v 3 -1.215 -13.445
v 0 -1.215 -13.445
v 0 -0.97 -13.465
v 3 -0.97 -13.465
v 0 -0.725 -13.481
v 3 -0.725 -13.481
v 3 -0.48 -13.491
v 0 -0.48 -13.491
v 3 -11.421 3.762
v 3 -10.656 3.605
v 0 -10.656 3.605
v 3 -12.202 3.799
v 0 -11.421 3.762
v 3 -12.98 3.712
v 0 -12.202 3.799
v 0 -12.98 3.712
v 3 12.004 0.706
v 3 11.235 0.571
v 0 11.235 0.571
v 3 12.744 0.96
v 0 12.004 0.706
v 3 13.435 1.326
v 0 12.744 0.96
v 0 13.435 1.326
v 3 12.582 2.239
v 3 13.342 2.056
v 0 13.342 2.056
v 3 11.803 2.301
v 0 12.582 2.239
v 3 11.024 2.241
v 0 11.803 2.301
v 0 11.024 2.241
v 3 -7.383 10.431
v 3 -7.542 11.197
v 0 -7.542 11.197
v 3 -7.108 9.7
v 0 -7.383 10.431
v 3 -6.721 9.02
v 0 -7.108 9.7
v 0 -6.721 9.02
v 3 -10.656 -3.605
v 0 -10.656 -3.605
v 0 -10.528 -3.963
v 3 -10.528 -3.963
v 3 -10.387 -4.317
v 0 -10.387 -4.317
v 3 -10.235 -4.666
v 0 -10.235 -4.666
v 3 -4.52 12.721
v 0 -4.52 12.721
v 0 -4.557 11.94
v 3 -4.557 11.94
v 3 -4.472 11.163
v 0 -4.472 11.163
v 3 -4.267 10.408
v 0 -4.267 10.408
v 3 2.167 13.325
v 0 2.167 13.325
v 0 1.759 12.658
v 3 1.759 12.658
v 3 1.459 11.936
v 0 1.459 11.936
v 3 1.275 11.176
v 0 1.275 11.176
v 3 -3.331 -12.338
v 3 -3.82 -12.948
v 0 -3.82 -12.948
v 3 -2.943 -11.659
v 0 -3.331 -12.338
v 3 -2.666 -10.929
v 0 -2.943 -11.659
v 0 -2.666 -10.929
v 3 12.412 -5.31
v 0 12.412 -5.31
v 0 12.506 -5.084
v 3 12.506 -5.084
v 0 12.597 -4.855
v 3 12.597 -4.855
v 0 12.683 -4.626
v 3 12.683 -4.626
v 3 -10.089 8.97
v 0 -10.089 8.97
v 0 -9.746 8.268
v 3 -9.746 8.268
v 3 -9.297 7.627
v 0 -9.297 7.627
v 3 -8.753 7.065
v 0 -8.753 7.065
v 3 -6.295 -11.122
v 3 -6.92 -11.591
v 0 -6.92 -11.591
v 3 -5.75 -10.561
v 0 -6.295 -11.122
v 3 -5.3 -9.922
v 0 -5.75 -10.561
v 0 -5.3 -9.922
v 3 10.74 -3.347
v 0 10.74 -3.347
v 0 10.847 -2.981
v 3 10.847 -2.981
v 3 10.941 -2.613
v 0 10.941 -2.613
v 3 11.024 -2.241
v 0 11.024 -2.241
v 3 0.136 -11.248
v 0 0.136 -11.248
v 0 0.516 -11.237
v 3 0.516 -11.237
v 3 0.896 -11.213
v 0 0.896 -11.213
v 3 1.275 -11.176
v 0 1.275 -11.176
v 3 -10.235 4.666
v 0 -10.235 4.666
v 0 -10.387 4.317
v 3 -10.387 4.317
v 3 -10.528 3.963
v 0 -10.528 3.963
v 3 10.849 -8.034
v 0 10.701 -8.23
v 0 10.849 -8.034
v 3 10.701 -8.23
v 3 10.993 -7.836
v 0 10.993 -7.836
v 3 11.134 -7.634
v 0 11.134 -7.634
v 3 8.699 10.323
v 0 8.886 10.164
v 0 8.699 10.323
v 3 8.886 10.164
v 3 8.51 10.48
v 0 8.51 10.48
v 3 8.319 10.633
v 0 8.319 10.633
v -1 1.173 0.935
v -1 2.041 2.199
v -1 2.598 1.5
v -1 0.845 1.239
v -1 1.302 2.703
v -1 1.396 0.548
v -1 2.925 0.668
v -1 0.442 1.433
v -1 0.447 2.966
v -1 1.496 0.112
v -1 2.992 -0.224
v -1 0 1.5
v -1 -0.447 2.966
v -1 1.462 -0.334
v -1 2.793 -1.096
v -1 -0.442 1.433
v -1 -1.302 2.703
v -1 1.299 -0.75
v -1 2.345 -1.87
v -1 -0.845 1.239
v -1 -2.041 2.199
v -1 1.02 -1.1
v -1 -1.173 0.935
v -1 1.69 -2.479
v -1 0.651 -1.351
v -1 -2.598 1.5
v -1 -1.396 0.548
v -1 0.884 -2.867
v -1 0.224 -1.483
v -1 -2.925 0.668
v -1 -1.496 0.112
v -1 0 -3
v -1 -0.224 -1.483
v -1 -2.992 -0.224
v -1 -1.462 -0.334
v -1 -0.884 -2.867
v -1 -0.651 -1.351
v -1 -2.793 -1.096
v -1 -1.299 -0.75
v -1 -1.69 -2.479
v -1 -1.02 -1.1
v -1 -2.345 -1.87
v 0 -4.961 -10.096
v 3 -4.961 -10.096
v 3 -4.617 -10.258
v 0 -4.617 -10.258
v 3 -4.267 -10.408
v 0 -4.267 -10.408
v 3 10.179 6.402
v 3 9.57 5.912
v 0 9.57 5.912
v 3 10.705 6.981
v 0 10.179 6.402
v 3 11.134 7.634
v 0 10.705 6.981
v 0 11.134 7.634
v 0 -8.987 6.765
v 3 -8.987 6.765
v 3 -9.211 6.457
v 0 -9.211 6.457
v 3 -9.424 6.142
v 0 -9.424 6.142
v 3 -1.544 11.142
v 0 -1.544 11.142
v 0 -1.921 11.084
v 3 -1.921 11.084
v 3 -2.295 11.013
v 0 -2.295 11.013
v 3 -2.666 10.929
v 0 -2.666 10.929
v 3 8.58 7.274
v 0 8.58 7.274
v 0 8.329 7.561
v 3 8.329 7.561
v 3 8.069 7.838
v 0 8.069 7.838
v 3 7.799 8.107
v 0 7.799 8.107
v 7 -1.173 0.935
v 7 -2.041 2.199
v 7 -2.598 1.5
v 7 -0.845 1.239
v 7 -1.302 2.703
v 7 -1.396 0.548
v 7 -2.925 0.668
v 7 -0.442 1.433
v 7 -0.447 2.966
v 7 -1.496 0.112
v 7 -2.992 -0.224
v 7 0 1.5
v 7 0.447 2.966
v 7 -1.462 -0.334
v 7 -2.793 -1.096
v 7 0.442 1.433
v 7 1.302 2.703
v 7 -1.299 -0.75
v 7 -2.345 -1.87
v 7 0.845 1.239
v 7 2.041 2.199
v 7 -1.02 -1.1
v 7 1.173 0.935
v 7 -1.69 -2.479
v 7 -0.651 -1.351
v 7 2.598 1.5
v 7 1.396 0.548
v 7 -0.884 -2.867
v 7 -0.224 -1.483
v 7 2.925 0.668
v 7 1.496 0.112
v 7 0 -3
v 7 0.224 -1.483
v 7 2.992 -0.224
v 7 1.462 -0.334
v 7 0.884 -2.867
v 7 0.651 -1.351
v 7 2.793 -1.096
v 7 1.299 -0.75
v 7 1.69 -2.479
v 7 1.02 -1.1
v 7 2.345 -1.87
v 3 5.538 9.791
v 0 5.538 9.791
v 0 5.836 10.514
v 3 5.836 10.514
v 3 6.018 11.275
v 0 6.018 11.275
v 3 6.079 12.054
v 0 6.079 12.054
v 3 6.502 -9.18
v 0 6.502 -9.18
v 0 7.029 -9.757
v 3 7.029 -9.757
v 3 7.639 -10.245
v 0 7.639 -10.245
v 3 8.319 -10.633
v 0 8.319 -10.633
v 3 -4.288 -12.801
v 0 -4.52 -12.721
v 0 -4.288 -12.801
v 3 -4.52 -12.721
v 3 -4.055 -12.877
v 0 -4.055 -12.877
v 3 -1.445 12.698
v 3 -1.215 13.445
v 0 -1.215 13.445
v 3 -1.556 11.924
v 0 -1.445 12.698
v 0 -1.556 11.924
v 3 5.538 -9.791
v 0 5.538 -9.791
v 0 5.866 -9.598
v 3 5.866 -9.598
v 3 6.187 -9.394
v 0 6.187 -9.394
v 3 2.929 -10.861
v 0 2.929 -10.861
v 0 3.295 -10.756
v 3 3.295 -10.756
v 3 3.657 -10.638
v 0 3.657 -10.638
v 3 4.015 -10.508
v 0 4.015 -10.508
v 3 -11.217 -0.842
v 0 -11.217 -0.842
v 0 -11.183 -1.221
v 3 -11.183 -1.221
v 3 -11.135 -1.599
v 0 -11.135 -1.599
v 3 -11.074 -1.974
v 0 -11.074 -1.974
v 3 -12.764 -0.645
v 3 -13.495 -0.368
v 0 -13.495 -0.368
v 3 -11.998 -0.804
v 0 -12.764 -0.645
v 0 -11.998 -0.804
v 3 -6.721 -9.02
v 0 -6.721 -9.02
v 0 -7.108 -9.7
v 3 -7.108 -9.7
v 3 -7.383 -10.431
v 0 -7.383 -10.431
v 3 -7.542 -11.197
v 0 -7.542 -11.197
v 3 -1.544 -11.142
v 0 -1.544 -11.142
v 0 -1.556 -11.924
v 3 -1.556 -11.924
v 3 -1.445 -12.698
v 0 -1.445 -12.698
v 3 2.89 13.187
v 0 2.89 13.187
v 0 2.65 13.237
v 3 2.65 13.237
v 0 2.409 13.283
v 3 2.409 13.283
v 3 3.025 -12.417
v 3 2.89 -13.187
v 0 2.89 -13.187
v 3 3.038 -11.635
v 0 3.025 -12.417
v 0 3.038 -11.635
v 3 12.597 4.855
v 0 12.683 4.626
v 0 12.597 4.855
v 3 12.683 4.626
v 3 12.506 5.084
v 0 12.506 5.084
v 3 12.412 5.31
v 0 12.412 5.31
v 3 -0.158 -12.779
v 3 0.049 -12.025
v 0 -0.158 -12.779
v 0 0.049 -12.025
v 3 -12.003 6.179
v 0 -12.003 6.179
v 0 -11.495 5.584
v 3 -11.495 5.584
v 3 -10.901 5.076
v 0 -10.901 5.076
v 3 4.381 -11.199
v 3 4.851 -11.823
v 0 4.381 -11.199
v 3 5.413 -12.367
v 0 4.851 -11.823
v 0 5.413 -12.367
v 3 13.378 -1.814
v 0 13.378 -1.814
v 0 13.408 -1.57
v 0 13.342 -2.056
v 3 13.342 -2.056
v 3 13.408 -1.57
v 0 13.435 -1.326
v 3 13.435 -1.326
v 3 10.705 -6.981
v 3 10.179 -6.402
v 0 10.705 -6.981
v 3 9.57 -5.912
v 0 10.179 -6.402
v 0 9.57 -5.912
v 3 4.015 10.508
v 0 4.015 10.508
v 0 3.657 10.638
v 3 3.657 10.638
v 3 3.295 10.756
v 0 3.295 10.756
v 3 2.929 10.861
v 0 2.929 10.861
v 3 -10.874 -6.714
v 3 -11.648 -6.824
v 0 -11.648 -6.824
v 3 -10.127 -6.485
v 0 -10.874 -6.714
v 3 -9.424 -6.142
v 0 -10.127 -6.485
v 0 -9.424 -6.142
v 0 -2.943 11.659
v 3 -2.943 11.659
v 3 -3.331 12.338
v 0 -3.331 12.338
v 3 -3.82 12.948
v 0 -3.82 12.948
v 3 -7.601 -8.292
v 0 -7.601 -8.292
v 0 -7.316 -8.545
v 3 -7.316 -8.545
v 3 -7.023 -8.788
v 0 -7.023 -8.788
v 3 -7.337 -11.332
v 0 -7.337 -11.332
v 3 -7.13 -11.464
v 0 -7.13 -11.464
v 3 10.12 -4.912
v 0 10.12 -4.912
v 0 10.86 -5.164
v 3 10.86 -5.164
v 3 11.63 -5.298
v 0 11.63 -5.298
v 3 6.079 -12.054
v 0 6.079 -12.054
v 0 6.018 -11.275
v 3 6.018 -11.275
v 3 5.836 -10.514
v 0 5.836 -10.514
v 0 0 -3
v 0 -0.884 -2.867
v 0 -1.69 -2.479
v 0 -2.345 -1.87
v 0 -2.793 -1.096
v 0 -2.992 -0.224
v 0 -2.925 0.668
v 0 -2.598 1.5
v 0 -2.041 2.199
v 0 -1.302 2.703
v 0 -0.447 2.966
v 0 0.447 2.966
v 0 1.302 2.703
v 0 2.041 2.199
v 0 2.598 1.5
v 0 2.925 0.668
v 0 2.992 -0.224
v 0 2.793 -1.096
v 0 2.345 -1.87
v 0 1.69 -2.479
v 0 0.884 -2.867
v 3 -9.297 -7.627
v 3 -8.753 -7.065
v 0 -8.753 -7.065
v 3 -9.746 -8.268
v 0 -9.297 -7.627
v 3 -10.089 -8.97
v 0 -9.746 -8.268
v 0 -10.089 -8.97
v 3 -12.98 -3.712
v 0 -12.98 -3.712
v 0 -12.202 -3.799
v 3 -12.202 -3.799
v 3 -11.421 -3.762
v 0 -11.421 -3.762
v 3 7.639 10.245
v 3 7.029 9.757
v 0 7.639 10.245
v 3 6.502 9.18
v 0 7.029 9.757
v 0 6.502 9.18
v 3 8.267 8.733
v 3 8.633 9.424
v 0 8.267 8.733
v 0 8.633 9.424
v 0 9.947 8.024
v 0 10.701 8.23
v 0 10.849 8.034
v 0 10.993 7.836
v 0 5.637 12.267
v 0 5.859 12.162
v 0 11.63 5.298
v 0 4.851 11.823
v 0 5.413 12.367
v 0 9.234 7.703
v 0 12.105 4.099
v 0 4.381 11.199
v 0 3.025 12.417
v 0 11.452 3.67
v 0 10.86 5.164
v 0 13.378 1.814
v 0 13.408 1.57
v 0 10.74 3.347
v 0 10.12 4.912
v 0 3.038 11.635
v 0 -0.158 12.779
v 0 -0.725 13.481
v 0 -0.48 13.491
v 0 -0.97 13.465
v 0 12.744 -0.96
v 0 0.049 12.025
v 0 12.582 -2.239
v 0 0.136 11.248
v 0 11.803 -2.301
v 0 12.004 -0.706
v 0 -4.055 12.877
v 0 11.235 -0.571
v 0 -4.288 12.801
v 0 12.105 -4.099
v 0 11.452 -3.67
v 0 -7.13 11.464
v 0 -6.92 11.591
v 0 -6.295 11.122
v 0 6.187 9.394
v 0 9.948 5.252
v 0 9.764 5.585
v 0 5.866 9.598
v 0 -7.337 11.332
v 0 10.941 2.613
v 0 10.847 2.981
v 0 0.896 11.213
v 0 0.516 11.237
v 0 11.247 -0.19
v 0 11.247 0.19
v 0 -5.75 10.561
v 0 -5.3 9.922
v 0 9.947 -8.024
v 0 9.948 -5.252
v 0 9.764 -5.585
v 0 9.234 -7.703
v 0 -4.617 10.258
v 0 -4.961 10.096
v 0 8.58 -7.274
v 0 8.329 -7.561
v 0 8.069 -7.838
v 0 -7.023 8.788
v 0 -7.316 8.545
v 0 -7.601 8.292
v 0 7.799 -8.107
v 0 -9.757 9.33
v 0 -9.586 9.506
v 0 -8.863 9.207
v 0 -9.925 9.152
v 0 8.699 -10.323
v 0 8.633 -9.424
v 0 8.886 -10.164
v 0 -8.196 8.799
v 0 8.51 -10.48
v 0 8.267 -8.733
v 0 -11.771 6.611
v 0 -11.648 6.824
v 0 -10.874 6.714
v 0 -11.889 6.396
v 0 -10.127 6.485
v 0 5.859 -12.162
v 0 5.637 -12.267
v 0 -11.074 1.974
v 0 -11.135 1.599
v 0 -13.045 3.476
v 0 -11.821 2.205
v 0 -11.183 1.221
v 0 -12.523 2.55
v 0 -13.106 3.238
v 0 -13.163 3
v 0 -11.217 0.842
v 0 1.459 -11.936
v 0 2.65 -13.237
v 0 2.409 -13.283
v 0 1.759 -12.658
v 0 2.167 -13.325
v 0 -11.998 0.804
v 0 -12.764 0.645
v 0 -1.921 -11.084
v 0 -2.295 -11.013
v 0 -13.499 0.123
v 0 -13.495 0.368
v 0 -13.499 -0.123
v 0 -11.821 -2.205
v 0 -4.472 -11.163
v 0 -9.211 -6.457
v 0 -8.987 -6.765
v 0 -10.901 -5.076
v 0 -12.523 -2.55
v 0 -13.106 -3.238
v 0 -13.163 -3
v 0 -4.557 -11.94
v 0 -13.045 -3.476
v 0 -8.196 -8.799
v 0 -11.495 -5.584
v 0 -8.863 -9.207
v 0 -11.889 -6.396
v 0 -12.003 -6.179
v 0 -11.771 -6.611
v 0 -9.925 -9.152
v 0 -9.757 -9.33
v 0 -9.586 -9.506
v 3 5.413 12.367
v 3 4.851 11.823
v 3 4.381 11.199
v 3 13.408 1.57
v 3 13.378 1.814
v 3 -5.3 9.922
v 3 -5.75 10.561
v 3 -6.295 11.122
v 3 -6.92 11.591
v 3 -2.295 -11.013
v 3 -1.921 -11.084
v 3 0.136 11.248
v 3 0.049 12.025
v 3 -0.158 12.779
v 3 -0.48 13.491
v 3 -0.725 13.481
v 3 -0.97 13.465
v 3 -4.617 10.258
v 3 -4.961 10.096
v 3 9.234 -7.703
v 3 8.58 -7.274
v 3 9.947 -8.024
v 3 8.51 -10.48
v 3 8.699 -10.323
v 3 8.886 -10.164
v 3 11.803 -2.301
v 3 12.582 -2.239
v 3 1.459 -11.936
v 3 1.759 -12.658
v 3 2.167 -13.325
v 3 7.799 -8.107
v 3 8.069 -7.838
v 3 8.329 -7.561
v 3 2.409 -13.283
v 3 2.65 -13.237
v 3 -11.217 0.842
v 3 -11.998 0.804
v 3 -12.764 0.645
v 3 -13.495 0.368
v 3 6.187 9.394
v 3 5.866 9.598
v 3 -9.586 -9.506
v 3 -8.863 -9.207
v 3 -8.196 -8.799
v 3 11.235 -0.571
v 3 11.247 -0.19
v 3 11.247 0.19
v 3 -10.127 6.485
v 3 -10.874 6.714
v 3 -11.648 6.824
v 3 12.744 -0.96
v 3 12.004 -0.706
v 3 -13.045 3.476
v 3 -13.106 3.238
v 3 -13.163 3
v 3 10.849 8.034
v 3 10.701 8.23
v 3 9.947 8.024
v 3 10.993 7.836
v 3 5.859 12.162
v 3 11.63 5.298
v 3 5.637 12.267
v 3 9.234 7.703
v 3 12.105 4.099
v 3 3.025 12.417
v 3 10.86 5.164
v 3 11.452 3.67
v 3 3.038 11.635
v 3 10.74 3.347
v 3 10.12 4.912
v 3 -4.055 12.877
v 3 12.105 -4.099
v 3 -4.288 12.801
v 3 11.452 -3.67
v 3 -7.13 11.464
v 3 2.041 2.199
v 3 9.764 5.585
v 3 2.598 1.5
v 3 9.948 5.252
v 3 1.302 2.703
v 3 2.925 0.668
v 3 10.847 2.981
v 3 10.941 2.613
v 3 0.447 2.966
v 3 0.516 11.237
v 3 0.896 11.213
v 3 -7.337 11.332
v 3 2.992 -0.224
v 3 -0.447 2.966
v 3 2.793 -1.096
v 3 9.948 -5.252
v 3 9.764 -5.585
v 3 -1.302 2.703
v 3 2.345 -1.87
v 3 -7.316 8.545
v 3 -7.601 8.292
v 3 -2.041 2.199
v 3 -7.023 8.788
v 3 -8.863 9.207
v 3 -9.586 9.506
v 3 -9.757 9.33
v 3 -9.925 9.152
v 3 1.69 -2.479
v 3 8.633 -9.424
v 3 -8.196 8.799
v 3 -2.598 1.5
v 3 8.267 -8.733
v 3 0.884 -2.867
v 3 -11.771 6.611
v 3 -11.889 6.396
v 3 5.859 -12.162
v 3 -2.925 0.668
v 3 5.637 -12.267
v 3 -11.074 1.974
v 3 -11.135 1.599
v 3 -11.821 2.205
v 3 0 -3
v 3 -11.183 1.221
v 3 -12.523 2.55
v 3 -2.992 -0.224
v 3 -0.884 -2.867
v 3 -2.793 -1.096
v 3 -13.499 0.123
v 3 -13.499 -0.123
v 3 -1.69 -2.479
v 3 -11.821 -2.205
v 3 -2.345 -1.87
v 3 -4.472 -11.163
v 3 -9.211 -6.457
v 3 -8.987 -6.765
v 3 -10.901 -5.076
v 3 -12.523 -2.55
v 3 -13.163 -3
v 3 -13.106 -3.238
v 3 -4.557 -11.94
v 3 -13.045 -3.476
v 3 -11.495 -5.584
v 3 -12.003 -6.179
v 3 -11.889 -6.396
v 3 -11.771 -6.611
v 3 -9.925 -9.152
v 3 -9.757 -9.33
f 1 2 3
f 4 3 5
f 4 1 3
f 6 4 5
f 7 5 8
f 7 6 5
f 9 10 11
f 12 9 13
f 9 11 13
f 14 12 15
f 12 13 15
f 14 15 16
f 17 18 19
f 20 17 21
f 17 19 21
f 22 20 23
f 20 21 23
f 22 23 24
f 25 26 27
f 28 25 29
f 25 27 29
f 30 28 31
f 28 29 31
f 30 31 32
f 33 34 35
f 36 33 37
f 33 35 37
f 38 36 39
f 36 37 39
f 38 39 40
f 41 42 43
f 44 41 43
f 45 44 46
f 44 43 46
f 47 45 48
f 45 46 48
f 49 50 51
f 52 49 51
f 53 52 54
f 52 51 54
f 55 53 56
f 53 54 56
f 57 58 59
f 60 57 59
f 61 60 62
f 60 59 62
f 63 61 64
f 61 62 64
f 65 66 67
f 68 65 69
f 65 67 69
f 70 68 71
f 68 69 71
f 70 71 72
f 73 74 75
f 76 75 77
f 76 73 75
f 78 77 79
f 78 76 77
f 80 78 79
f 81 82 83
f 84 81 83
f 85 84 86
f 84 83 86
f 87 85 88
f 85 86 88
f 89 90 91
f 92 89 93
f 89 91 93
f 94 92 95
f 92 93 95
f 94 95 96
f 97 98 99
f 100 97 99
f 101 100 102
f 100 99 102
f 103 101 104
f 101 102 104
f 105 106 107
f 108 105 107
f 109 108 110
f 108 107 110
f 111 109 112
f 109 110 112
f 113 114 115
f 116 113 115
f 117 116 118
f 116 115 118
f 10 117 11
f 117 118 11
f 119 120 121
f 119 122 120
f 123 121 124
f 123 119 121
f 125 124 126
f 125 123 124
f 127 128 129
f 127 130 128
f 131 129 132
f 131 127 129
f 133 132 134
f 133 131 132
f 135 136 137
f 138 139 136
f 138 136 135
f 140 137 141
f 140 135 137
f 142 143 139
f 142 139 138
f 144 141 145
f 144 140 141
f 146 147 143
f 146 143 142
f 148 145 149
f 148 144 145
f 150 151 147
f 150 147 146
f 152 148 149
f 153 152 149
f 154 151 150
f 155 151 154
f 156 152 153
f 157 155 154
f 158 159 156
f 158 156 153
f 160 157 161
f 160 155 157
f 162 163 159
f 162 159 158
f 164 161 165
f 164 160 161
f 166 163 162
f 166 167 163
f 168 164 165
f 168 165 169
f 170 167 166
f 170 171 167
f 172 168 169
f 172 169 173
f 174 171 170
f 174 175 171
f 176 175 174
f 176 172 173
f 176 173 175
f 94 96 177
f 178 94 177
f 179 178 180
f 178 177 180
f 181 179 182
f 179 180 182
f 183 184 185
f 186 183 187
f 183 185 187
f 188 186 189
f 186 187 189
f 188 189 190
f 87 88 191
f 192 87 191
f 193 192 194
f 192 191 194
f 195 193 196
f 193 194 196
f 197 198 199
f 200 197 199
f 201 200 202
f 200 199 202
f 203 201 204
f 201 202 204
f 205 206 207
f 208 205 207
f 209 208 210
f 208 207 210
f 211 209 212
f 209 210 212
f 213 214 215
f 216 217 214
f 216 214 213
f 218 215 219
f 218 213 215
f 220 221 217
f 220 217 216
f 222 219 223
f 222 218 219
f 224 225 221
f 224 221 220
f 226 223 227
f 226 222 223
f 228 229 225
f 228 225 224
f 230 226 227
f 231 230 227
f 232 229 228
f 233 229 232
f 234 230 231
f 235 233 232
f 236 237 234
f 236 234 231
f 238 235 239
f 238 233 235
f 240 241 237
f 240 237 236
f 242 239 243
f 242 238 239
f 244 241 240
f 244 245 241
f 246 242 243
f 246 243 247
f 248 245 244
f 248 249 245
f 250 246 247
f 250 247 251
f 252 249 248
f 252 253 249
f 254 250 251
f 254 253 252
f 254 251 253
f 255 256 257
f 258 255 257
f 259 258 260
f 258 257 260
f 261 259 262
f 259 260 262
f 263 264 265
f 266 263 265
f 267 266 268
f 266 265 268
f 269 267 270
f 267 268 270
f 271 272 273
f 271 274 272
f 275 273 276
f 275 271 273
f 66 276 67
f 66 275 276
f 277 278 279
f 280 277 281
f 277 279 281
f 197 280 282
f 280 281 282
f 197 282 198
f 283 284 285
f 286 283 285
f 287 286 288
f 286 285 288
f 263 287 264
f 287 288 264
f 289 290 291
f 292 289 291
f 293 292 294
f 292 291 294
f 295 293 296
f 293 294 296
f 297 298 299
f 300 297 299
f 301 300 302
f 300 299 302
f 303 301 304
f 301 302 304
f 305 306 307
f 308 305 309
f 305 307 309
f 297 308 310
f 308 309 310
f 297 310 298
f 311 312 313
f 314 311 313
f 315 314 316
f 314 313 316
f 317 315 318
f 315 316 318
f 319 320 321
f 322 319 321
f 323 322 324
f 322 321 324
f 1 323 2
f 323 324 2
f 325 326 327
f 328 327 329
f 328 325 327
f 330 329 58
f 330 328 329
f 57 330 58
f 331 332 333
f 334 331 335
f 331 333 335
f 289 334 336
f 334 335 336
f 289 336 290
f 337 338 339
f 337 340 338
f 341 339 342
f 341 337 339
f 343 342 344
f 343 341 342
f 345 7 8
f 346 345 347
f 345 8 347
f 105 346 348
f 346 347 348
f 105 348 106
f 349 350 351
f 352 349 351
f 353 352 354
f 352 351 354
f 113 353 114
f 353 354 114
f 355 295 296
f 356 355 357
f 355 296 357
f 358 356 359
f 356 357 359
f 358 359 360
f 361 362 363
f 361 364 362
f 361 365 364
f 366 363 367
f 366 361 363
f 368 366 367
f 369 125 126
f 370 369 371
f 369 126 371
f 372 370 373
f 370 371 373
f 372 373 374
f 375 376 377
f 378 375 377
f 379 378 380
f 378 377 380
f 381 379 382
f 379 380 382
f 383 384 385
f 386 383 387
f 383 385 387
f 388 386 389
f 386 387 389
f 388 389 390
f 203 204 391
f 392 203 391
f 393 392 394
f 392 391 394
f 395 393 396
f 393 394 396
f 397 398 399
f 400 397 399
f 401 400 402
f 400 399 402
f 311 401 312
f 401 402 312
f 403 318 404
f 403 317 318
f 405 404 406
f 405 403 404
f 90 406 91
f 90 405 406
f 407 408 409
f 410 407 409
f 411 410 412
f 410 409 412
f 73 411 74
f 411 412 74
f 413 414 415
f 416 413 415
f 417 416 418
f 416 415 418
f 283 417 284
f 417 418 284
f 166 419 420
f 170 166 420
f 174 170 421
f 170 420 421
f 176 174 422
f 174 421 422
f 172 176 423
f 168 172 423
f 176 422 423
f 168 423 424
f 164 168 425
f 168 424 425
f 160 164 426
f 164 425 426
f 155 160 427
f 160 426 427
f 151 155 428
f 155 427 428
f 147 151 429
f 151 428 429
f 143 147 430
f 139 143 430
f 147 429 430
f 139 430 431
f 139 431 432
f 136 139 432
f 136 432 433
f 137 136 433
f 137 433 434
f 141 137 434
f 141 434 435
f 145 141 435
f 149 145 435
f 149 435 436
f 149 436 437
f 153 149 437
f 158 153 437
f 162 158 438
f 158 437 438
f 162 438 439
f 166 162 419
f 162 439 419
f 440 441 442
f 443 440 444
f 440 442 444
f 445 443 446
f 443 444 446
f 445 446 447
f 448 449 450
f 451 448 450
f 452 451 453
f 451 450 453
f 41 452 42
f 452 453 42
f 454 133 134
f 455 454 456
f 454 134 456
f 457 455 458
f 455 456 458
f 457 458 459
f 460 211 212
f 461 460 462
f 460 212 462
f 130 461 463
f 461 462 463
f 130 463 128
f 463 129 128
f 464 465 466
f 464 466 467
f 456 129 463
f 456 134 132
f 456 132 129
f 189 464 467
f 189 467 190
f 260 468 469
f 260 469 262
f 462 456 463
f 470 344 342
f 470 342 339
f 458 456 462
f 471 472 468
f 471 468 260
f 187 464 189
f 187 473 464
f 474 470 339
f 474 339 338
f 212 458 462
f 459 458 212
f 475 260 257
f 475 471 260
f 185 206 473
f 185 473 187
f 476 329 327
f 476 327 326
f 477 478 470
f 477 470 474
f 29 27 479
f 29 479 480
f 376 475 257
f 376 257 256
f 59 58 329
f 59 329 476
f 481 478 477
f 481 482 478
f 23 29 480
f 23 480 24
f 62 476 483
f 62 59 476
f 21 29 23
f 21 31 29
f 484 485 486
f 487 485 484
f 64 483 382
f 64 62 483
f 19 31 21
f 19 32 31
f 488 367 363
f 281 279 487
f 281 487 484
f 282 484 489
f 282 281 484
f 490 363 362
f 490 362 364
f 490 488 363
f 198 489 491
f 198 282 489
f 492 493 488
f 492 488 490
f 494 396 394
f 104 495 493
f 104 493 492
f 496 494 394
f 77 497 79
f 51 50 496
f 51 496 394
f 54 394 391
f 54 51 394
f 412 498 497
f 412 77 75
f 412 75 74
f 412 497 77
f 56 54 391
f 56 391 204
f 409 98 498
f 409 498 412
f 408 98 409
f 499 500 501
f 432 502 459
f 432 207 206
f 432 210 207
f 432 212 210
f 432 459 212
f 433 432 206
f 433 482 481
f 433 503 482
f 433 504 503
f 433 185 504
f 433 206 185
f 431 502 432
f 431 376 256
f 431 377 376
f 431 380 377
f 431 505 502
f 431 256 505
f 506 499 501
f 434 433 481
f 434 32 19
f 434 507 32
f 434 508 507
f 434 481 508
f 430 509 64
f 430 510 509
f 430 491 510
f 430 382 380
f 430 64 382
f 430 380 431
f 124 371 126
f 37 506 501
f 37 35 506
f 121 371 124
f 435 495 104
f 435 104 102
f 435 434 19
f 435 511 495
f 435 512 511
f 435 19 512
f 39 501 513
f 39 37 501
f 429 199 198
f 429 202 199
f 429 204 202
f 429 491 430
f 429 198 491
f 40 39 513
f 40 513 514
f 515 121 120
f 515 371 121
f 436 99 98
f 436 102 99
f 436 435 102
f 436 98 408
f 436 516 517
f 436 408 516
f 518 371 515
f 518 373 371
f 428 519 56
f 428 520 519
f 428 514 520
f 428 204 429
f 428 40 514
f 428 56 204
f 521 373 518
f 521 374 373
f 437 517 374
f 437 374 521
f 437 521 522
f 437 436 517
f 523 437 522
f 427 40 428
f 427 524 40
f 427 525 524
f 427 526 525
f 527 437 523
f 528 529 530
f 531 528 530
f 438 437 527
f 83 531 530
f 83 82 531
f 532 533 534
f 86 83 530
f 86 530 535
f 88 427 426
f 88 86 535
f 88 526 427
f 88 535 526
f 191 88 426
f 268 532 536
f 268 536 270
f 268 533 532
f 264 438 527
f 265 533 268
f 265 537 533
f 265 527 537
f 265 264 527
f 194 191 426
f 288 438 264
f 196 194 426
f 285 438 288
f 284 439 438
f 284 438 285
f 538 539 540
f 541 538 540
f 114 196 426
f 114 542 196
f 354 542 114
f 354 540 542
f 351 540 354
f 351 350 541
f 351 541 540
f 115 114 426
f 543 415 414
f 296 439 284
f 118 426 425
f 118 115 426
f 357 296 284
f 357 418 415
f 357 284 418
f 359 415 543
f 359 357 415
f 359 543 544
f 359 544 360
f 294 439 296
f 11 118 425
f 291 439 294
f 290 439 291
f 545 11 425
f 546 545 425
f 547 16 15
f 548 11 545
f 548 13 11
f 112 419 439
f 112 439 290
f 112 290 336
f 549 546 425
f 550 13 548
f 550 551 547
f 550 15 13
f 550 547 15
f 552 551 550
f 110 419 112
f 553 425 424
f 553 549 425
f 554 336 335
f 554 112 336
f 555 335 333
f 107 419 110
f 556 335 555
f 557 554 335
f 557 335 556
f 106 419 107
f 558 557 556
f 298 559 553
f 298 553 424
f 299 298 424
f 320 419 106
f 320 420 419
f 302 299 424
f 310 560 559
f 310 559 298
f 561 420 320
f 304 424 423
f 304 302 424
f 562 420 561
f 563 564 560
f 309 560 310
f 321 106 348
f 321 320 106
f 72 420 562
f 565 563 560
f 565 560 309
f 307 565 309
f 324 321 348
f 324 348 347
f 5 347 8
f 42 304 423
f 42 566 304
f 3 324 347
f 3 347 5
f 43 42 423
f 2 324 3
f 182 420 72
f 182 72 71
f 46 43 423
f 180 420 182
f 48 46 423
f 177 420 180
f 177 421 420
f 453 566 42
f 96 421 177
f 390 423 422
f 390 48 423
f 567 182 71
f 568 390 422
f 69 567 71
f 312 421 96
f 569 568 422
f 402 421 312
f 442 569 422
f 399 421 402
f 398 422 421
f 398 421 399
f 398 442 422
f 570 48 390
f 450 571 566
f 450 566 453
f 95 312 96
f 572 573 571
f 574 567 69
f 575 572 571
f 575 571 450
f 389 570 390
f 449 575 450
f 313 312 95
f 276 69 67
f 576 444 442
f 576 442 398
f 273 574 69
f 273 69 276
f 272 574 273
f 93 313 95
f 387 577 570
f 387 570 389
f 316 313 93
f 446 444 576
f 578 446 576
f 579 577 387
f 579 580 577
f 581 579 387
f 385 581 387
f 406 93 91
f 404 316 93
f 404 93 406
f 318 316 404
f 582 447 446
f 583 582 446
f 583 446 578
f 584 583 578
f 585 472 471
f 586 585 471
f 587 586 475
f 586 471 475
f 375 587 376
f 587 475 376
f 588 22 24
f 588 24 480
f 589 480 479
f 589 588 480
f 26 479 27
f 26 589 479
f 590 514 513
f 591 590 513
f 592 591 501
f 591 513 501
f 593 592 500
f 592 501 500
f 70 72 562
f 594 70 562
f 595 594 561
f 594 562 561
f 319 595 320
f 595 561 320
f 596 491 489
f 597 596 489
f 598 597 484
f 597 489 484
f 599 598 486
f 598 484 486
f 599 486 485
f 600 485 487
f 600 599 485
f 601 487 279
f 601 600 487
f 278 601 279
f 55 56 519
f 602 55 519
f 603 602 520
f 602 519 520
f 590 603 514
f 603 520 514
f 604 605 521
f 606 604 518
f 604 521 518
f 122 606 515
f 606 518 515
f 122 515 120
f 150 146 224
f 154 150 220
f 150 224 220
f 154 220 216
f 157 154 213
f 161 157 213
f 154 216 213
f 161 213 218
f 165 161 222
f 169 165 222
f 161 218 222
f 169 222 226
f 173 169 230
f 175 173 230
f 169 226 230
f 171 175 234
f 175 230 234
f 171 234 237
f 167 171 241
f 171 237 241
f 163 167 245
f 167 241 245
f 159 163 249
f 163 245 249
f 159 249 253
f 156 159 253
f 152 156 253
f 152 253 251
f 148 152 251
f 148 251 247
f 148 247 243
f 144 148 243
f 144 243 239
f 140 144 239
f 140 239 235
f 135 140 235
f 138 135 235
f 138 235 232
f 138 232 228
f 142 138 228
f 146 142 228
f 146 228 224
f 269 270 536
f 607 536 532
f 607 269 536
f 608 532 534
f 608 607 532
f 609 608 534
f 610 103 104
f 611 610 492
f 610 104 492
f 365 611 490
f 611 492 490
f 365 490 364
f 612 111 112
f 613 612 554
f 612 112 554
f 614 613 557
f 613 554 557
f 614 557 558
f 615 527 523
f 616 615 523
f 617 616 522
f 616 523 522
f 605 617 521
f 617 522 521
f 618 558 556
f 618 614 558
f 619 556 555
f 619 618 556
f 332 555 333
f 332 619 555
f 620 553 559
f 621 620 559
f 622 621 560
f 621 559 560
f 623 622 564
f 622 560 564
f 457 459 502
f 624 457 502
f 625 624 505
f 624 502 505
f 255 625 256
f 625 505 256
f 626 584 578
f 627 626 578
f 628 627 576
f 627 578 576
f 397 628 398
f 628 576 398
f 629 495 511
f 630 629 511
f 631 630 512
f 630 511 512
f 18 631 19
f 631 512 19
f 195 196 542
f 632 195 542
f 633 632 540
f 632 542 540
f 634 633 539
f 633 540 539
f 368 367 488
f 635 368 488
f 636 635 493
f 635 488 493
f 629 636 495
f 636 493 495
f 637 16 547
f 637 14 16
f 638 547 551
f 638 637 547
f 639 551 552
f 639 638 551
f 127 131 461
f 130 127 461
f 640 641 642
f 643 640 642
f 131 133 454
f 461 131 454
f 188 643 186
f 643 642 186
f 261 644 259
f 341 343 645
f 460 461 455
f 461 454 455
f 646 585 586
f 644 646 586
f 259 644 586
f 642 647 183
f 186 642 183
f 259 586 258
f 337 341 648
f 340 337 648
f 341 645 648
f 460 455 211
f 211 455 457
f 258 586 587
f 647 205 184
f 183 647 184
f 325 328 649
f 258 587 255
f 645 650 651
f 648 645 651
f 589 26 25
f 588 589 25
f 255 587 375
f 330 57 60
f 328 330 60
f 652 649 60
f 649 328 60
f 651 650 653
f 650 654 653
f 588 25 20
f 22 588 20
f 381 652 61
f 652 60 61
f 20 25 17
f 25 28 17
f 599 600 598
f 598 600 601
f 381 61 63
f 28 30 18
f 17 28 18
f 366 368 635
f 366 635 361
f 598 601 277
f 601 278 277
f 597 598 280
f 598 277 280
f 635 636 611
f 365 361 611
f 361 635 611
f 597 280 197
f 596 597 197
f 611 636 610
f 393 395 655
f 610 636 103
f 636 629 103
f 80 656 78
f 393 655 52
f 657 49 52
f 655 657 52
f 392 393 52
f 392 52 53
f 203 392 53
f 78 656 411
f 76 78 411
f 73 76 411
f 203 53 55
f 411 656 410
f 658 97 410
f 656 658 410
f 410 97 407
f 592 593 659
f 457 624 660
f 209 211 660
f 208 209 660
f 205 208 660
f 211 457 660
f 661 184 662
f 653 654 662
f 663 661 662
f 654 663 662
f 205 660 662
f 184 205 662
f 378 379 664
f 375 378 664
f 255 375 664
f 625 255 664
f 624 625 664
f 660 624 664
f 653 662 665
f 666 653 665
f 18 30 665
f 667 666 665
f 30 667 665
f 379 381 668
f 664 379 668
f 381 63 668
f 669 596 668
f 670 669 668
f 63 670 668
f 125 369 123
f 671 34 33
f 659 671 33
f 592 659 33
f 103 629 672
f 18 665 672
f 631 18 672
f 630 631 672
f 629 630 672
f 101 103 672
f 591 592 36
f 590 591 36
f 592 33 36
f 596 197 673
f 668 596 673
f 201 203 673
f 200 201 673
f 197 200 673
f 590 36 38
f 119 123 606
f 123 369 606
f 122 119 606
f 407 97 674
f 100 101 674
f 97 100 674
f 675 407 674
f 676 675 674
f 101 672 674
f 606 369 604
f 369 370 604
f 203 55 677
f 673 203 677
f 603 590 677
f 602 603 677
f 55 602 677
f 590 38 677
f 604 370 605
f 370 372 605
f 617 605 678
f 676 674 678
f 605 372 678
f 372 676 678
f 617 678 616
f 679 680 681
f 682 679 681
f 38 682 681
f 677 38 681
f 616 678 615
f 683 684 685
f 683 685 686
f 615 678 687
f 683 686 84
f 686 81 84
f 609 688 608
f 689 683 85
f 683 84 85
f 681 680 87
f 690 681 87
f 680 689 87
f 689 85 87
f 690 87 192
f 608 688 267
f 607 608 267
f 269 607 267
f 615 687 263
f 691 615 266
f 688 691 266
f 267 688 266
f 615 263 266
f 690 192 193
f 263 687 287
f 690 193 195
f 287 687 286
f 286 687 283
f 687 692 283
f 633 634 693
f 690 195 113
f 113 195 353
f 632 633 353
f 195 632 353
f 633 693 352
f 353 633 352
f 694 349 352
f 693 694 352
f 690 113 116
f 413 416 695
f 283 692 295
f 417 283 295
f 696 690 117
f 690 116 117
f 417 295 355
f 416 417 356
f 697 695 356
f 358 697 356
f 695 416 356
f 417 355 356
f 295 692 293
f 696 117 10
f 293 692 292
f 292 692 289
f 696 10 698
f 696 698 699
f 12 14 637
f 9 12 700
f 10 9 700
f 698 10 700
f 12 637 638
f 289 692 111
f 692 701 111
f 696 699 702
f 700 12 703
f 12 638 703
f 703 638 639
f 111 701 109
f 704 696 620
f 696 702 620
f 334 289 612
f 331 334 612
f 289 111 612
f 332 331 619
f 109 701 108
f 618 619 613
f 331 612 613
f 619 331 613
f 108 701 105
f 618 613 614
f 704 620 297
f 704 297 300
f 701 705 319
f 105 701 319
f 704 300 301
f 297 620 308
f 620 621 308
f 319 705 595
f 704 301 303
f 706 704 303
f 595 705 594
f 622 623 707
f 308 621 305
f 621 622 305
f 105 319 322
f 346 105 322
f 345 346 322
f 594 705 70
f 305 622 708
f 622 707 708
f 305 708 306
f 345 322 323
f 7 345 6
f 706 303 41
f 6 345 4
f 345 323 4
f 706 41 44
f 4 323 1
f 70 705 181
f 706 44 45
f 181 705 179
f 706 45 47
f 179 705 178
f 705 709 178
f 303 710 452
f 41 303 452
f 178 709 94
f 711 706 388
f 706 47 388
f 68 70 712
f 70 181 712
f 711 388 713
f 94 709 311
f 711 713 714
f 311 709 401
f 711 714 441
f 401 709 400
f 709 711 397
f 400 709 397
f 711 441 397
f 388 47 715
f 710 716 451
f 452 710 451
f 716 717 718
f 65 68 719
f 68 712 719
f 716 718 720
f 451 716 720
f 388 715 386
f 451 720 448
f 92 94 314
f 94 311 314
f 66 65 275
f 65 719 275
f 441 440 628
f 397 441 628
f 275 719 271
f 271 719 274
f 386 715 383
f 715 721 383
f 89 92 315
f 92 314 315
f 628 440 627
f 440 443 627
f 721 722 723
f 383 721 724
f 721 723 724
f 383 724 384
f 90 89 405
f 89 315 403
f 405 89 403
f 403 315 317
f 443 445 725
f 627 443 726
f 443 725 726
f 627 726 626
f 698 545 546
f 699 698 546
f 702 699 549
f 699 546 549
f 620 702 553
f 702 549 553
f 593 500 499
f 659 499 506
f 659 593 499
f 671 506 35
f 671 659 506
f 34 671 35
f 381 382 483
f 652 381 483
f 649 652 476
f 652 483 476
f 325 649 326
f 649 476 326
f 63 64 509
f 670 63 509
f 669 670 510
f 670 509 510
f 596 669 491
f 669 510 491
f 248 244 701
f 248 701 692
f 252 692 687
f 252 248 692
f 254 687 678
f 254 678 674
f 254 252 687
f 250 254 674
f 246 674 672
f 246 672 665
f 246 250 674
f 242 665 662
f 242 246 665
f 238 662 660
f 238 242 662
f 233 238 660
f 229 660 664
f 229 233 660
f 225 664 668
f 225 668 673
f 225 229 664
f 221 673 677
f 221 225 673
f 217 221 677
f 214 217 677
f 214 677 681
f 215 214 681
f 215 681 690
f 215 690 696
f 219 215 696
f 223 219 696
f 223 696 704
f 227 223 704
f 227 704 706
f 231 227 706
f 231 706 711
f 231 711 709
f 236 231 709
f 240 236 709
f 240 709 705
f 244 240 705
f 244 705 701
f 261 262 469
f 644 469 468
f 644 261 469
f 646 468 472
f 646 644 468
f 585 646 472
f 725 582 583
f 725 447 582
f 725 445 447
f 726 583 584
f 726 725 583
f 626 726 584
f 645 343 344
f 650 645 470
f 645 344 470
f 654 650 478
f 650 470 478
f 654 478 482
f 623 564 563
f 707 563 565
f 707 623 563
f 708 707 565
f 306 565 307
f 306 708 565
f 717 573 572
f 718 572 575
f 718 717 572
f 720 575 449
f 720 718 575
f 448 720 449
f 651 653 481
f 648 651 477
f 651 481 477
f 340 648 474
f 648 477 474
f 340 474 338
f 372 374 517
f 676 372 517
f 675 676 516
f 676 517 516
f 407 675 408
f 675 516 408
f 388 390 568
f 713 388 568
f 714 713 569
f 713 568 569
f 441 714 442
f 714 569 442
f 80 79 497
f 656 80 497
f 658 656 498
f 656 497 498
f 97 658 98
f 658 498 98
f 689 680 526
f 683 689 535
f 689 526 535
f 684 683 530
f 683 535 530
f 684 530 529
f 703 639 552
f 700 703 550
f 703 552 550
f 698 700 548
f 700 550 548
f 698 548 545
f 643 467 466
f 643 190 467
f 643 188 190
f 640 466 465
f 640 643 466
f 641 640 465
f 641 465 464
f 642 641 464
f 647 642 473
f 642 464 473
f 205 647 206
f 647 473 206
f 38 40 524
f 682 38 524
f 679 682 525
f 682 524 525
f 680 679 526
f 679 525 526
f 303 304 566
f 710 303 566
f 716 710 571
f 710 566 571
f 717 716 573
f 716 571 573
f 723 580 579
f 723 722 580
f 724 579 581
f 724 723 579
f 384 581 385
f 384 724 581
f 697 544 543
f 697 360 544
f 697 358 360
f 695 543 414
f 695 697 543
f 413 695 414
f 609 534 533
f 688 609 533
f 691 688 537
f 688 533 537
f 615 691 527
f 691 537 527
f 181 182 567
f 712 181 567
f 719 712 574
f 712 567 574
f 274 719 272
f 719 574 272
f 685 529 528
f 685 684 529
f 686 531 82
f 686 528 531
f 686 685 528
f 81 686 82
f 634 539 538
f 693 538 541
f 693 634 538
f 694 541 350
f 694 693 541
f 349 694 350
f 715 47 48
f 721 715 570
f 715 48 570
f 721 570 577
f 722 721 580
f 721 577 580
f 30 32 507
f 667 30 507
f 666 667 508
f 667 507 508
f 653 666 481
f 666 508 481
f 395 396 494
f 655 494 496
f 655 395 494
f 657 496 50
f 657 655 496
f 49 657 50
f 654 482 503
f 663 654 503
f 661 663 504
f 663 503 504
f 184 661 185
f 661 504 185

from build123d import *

# Parameters (mm, degrees)
BASPROSKE_W         = 3
BASPROSKE_H         = 13.5
TOOTHCUT_DEPTH      = 20.32614809
TEETHCUTS_COUNT     = 25
HUBNEABOTSKE_R      = 3
HUBNEARBOTH_DEPTH   = 1.0000254
HUBFAR_START        = 1.0000254
HUBFARSKE_R         = 3
HUBFAR_DEPTH        = 1.0000254
BORSKE_R            = 1.5
BORE_DEPTH          = 5.0000508
BOSS_EXTRUDE1_START = 3
SKETCH1_R           = 3
SKETCH1_R_2         = 1.5
BOSS_EXTRUDE1_DEPTH = 3


with BuildPart() as part:
    # BasProSke → Base-Revolve (revolve)
    with BuildSketch(Plane(origin=(0, 0, 0), x_dir=(1, 0, 0), z_dir=(0, 1, 0)), mode=Mode.PRIVATE) as base_revolve_sk:
        with Locations((1.5, 6.75)):
            Rectangle(BASPROSKE_W, BASPROSKE_H)
    revolve(base_revolve_sk.sketch.rotate(Axis((-10, 0, 0), (1, 0, 0)), 180), axis=Axis((-10, 0, 0), (1, 0, 0)))

    # TooCutSke → ToothCut (cut, through all)
    with BuildSketch(Plane(origin=(0, 0, 0), x_dir=(0, 0, -1), z_dir=(1, 0, 0))):
        with BuildLine():
            ThreePointArc((0.570809389, 11.23450834), (0, 11.249), (-0.570809389, 11.23450834))
            ThreePointArc((-0.570809389, 11.23450834), (-0.823468719, 12.39261054), (-1.341642157, 13.4586939))
            ThreePointArc((-1.341642157, 13.4586939), (0, 13.5254), (1.341642157, 13.4586939))
            ThreePointArc((1.341642157, 13.4586939), (0.823468719, 12.39261054), (0.570809389, 11.23450834))
        make_face()
    toothcut = extrude(amount=TOOTHCUT_DEPTH, mode=Mode.SUBTRACT)

    # TeethCuts: ToothCut ×25 about axis
    teethcuts_axis = Axis((0, 0, 0), (1, 0, 0))
    for i in range(1, TEETHCUTS_COUNT):
        add(toothcut.rotate(teethcuts_axis, i * 360 / TEETHCUTS_COUNT), mode=Mode.SUBTRACT)

    # HubNeaBotSke → HubNearBoth (add)
    with BuildSketch(Plane.ZY):
        with Locations(Location((0, 0, 0), (0, 0, 180))):
            Circle(HUBNEABOTSKE_R)
    extrude(amount=HUBNEARBOTH_DEPTH)

    # HubFarSke → HubFar (add)
    with BuildSketch(Plane(origin=(3, 0, 0), x_dir=(0, 0, -1), z_dir=(1, 0, 0)).offset(HUBFAR_START)):
        Circle(HUBFARSKE_R)
    extrude(amount=-HUBFAR_DEPTH)

    # BorSke → Bore (cut, symmetric)
    with BuildSketch(Plane(origin=(0, 0, 0), x_dir=(0, 0, -1), z_dir=(1, 0, 0))):
        with Locations(Location((0, 0, 0), (0, 0, 180))):
            Circle(BORSKE_R)
    extrude(amount=BORE_DEPTH, both=True, mode=Mode.SUBTRACT)

    # Sketch1 → Boss-Extrude1 (add)
    with BuildSketch(Plane(origin=(4.0000254, 0, 0), x_dir=(0, 0, -1), z_dir=(1, 0, 0)).offset(BOSS_EXTRUDE1_START)):
        Circle(SKETCH1_R)
        with Locations(Location((0, 0, 0), (0, 0, 180))):
            Circle(SKETCH1_R_2, mode=Mode.SUBTRACT)
    extrude(amount=-BOSS_EXTRUDE1_DEPTH)


solid = part.part
